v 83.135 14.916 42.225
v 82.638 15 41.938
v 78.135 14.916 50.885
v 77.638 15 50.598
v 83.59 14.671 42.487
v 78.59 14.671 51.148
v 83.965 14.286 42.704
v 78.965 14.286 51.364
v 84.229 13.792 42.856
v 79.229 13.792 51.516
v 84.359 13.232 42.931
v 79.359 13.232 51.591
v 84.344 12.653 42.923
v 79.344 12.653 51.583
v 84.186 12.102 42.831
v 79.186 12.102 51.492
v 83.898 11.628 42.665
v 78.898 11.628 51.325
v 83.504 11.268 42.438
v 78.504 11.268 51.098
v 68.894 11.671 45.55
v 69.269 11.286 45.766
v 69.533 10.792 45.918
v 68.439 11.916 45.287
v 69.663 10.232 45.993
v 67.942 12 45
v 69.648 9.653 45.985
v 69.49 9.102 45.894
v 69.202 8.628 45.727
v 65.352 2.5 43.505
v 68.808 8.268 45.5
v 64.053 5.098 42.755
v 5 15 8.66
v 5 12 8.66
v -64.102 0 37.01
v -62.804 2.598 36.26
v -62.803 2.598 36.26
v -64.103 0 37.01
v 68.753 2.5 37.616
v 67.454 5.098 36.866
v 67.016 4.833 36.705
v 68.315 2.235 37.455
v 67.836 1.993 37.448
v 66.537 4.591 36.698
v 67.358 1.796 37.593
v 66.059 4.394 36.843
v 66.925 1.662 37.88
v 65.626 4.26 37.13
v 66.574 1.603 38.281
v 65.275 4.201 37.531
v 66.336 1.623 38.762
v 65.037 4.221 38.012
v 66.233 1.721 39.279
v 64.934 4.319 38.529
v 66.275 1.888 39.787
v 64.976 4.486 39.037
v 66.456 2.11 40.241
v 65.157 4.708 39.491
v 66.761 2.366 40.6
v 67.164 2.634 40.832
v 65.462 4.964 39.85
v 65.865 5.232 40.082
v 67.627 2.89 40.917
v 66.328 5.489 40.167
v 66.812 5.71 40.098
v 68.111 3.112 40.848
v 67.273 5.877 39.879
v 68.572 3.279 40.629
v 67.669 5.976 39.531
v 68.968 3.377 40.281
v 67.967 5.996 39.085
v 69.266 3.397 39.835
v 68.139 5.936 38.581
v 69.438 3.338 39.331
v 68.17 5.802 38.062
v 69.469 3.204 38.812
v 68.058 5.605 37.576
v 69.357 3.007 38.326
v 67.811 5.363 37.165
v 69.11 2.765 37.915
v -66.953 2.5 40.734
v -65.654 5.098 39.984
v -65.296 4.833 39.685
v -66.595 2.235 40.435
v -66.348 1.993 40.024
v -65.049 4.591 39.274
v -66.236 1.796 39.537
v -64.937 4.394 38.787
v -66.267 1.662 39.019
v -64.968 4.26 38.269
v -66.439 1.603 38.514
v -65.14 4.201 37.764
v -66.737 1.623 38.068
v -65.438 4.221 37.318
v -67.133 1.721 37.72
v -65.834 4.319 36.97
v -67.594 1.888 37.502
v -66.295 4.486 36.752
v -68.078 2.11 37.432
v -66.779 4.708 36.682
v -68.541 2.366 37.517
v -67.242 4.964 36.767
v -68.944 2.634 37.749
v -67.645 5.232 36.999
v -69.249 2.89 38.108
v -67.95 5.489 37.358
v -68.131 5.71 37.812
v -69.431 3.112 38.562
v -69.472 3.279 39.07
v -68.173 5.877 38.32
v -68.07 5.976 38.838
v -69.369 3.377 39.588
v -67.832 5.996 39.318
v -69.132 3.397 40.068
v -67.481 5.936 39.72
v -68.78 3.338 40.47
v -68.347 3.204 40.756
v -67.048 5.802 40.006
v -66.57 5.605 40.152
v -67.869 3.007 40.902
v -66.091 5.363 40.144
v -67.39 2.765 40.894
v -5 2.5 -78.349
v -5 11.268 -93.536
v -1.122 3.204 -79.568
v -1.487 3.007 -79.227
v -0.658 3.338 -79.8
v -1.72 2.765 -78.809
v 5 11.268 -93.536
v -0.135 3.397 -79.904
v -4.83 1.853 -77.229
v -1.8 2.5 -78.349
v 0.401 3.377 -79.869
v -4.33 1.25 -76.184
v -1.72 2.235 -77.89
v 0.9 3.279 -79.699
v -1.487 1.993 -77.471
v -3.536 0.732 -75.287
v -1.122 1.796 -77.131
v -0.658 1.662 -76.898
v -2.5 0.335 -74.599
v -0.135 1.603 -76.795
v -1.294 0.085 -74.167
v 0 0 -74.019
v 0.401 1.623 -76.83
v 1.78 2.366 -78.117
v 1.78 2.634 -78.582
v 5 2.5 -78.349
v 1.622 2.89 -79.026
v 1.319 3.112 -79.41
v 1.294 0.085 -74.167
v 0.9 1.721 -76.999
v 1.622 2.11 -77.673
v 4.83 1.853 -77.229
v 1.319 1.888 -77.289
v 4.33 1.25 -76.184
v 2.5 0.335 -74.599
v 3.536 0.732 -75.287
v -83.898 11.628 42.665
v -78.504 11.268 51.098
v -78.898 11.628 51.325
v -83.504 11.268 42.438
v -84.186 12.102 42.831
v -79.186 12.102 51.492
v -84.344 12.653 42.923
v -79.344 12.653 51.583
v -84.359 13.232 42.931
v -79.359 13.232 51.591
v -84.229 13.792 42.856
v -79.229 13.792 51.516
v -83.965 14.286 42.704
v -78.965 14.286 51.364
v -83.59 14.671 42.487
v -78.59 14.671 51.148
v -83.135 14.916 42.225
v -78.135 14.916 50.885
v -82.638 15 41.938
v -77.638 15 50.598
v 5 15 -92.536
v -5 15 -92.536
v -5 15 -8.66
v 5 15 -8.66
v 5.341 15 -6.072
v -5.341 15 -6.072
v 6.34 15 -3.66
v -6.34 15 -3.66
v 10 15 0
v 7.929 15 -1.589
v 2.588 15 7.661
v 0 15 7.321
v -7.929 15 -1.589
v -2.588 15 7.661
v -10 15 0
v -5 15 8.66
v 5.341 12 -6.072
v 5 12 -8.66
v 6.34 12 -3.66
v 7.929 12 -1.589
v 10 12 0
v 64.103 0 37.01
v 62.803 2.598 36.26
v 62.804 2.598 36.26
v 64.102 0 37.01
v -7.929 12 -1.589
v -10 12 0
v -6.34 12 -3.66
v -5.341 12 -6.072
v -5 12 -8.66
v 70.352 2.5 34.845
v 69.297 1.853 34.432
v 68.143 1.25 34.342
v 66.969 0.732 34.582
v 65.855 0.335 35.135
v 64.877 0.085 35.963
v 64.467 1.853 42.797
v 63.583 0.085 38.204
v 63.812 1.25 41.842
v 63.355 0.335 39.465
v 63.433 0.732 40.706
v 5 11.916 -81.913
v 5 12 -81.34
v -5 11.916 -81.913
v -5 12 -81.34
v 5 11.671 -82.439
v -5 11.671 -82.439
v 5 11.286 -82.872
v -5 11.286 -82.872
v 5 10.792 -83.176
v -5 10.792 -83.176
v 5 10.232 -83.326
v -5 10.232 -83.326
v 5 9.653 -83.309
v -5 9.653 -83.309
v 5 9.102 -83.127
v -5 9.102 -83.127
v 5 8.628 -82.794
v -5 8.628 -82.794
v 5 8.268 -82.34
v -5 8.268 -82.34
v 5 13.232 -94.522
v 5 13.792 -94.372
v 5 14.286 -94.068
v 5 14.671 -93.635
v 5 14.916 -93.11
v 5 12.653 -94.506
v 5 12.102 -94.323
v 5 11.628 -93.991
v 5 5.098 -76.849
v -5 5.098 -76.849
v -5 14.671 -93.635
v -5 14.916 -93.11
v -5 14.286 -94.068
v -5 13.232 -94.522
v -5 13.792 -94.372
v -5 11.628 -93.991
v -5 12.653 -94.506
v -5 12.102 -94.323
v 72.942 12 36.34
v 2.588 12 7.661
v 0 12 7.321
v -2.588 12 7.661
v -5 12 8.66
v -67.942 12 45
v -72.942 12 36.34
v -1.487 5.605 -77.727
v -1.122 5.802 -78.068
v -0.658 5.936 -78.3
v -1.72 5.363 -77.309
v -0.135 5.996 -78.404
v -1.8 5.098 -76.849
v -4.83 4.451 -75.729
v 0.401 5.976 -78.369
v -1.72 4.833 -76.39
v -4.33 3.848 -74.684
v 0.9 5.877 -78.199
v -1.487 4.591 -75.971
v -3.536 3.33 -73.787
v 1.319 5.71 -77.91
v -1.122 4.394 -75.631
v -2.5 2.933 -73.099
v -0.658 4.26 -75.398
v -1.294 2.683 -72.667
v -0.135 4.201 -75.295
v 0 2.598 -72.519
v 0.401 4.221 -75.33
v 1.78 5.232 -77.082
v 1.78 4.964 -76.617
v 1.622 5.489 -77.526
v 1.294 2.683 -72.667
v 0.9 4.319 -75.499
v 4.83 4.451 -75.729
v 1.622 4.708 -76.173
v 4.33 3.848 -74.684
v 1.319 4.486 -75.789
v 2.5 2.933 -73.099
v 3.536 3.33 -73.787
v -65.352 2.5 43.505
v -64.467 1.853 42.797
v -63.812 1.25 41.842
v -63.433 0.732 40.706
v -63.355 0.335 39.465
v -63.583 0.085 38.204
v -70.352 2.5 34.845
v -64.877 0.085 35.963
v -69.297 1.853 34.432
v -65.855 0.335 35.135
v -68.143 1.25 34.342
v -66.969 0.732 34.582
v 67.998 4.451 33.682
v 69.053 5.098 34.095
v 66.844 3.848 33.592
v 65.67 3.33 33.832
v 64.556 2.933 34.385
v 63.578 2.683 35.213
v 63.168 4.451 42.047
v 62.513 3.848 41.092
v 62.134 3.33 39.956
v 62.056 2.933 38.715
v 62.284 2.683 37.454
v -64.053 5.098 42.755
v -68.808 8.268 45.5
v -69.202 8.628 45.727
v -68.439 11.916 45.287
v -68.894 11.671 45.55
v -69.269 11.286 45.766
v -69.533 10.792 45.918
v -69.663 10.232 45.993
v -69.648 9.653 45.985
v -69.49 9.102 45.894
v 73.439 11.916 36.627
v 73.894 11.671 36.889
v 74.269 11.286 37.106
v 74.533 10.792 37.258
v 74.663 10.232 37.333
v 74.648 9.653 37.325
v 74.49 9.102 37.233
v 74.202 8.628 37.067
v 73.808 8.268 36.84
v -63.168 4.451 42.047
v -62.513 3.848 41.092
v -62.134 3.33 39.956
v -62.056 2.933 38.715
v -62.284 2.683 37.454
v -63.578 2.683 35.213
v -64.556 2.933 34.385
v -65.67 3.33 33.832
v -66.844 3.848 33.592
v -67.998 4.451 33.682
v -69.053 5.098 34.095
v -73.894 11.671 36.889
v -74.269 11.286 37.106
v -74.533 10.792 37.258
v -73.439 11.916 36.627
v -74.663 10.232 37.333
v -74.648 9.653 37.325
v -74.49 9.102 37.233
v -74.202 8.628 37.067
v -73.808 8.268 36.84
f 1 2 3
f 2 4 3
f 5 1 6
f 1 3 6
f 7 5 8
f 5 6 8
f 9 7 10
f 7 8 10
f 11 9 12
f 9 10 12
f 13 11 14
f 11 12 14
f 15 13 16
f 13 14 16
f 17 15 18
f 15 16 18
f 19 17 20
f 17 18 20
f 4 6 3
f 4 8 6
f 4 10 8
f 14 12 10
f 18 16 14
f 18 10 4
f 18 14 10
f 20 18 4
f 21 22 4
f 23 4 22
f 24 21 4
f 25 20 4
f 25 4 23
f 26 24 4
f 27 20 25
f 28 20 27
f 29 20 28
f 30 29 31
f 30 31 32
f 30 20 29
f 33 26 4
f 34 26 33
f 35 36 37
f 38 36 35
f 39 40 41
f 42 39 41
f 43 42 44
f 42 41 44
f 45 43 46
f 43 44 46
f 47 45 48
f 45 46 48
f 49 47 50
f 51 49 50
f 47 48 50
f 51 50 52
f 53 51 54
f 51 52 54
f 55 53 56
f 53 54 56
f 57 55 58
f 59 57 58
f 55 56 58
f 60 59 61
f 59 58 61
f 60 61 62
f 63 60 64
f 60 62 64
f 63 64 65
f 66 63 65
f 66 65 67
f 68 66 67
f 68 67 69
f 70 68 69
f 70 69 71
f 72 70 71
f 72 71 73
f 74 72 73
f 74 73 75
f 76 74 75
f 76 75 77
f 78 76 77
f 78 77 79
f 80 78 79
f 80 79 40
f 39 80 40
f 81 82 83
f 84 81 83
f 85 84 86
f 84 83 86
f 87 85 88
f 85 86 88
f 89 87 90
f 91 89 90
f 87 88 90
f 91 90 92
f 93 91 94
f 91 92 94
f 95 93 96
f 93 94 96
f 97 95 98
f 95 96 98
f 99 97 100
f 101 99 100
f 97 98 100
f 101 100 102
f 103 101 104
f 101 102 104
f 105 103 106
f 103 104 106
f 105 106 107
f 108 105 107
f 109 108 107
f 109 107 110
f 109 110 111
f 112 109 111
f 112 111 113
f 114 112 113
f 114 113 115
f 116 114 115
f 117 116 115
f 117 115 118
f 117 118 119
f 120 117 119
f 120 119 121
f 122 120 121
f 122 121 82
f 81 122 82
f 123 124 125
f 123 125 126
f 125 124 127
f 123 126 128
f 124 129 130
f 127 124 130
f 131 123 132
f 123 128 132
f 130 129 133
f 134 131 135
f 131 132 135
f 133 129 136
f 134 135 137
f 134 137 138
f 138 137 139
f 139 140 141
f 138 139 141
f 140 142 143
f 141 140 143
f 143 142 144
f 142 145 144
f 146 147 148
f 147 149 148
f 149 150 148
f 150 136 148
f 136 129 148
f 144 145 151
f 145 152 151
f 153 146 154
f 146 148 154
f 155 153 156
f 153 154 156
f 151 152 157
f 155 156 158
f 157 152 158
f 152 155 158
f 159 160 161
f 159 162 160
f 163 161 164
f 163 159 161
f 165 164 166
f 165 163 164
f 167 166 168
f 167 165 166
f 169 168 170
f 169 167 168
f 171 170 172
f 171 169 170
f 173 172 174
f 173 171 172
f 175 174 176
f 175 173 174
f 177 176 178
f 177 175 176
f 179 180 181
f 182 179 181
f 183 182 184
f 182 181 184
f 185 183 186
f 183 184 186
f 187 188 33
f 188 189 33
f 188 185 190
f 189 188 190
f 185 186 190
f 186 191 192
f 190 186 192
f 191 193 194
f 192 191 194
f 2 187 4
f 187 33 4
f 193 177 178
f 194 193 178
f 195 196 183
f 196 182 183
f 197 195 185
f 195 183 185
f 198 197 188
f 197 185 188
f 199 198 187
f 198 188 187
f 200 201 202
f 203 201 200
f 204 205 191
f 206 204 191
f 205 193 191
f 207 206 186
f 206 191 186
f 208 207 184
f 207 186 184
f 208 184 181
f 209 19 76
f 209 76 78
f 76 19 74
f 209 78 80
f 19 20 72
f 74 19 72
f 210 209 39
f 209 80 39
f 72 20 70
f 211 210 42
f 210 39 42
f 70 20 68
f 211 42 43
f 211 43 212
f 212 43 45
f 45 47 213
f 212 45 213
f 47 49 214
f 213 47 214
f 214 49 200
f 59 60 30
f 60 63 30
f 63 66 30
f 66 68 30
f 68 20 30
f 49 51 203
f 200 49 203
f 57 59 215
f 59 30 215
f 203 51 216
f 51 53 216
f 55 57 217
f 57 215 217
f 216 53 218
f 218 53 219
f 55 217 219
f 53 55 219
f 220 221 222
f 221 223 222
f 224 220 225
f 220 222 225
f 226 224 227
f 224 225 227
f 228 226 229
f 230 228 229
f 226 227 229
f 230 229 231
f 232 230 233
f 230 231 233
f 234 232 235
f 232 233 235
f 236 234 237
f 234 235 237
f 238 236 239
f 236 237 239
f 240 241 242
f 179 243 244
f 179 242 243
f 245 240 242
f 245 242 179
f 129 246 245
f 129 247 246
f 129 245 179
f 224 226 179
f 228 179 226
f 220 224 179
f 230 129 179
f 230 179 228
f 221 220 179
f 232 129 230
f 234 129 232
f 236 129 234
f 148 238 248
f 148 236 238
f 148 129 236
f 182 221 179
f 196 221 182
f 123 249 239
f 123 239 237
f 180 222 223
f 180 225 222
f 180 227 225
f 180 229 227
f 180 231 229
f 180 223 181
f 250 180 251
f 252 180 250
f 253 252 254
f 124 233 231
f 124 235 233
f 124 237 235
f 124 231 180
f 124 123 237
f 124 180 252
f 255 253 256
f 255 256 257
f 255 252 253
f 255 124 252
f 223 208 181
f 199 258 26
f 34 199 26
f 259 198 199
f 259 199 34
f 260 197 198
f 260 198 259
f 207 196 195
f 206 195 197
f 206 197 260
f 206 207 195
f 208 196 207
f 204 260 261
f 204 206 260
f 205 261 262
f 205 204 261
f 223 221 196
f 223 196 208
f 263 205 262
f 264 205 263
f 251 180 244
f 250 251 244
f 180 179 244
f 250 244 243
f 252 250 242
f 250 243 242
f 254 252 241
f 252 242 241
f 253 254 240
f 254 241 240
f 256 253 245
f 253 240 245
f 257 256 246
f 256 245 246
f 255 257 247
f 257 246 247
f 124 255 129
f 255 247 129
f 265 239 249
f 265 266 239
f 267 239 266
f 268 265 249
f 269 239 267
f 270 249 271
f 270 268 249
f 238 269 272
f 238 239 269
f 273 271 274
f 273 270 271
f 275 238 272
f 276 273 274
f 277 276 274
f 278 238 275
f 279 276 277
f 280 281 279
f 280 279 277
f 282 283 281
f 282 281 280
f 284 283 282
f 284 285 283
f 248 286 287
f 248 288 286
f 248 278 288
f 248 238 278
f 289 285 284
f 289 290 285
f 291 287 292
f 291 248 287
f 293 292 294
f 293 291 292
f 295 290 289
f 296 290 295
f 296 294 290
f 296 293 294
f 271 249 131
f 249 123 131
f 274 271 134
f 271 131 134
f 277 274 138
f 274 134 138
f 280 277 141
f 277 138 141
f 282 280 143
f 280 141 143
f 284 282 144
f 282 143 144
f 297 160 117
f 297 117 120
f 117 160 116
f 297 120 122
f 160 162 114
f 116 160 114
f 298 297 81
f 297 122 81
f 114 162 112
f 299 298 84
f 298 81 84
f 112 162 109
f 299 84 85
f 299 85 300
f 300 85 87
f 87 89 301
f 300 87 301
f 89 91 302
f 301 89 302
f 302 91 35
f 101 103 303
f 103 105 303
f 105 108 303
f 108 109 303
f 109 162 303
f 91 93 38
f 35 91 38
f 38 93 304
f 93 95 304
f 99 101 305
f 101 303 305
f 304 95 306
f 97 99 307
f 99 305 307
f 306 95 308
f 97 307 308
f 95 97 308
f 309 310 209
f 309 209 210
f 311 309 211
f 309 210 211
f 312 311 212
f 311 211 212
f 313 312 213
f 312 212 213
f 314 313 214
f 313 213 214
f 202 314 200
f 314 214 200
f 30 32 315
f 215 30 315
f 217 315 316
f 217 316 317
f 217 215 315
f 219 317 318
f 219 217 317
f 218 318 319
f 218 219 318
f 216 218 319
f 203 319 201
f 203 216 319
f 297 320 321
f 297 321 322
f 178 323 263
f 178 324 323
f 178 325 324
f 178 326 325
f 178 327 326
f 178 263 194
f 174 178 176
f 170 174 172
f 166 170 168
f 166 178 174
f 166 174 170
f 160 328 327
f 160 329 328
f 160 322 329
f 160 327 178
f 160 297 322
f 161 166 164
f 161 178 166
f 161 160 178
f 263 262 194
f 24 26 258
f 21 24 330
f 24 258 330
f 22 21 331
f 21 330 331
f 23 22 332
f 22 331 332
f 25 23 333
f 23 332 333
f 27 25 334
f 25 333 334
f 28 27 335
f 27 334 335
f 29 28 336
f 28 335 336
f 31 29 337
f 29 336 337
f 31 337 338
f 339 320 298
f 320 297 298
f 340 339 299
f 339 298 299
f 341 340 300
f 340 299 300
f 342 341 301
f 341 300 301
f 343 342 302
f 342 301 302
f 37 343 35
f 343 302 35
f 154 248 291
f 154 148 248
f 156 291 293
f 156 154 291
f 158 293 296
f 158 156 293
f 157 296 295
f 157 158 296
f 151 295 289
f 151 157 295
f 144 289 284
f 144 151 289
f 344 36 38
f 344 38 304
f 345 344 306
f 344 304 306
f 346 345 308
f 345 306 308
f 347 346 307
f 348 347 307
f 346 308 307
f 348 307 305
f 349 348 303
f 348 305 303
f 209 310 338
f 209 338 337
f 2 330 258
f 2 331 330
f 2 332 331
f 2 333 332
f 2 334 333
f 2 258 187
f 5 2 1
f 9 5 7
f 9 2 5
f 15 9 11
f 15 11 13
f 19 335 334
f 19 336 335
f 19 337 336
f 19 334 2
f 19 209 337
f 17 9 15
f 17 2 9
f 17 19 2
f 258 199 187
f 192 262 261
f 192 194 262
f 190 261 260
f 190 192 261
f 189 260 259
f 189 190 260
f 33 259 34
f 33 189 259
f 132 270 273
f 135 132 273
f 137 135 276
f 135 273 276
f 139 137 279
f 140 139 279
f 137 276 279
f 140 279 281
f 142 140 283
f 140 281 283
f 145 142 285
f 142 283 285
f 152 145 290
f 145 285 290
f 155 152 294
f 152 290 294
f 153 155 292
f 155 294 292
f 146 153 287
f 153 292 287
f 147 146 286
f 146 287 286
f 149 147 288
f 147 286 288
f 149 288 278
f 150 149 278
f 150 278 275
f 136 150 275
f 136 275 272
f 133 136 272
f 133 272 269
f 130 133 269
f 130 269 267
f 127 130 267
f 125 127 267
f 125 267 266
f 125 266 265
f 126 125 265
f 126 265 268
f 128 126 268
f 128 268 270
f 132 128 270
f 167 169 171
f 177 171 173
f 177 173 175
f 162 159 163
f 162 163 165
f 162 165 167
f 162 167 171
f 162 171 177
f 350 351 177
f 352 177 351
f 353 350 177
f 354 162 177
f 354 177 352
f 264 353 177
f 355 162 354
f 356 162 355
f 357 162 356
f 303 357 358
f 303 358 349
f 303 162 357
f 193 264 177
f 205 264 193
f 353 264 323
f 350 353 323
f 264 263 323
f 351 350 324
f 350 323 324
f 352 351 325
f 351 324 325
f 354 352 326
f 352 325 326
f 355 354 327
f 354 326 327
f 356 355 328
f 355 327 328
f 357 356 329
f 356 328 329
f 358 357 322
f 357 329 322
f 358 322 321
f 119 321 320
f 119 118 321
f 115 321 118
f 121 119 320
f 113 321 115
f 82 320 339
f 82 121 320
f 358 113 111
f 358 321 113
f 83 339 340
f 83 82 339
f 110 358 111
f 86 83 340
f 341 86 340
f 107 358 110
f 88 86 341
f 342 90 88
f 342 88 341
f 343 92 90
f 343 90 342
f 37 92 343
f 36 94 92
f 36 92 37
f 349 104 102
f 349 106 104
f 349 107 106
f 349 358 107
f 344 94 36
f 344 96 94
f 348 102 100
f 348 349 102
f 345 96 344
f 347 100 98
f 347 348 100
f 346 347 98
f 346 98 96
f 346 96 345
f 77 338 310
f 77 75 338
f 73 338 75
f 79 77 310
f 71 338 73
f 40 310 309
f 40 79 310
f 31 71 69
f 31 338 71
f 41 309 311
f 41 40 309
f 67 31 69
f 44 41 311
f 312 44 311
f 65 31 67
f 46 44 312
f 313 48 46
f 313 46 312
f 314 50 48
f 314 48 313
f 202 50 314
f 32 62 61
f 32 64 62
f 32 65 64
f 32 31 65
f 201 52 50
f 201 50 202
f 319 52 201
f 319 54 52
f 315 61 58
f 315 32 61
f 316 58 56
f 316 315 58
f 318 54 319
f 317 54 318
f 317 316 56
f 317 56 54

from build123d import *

# Parameters (mm, degrees)
BOSS_EXTRUDE1_DEPTH      = 15
CUT_EXTRUDE1_REACH       = 103.612
M3_CLEARANCE_HOLE1_D     = 3.6
M3_CLEARANCE_HOLE1_DEPTH = 3
CUT_EXTRUDE2_REACH       = 103.612
CIRPATTERN1_COUNT        = 3
FILLET1_R                = 2
FILLET2_R                = 10
FILLET3_R                = 5


with BuildPart() as part:
    # Sketch2 → Boss-Extrude1 (new body)
    with BuildSketch(Plane(origin=(0, 0, 0), x_dir=(1, 0, 0), z_dir=(0, 1, 0))):
        Polygon((0, 0), (-5, 2.886751346), (-5, 100), (5, 100), (5, 2.886751346), align=None)
    boss_extrude1 = extrude(amount=BOSS_EXTRUDE1_DEPTH)

    # Sketch3 → Cut-Extrude1 (cut, up to next)
    with BuildSketch(Plane(origin=(5, 0, 0), x_dir=(0, 0, -1), z_dir=(1, 0, 0)), mode=Mode.PRIVATE) as cut_extrude1_sk1:
        Polygon((0, 12), (88.803847577, 12), (68.019237886, 0), (0, 0), align=None)
    cut_extrude1_tool1 = extrude(cut_extrude1_sk1.sketch, amount=-CUT_EXTRUDE1_REACH, mode=Mode.PRIVATE) & part.part
    # Sketch3 → Cut-Extrude1 (cut, up to next)
    with BuildSketch(Plane(origin=(5, 0, 0), x_dir=(0, 0, -1), z_dir=(1, 0, 0)), mode=Mode.PRIVATE) as cut_extrude1_sk2:
        Polygon((100, 15), (74.019237886, 0), (100, 0), align=None)
    cut_extrude1_tool2 = extrude(cut_extrude1_sk2.sketch, amount=-CUT_EXTRUDE1_REACH, mode=Mode.PRIVATE) & part.part
    cut_extrude1_1 = cut_extrude1_tool1.solids().sort_by_distance((5, 6.265071, -39.435329))[0]
    add(cut_extrude1_1, mode=Mode.SUBTRACT)
    cut_extrude1_2 = cut_extrude1_tool2.solids().sort_by_distance((5, 5, -91.339746))[0]
    add(cut_extrude1_2, mode=Mode.SUBTRACT)
    cut_extrude1 = cut_extrude1_1 + cut_extrude1_2  # Cut-Extrude1 as one shape, for the pattern or mirror that repeats it

    # M3 Clearance Hole1
    with Locations(Plane(origin=(0, -32.051270189, -18.504809472), x_dir=(1, 0, 0), z_dir=(0, -0.8660254037844417, -0.49999999999999484))):
        with Locations((0, -69.102540378)):
            m3_clearance_hole1 = Hole(M3_CLEARANCE_HOLE1_D / 2, depth=M3_CLEARANCE_HOLE1_DEPTH)

    # Sketch6 → Cut-Extrude2 (cut, up to next)
    with BuildSketch(Plane(origin=(5, 0, 0), x_dir=(0, 0, -1), z_dir=(1, 0, 0)), mode=Mode.PRIVATE) as cut_extrude2_sk1:
        Polygon((74.019237886, 0), (68.019237886, 0), (72.519237886, 2.598076211), align=None)
    cut_extrude2_tool1 = extrude(cut_extrude2_sk1.sketch, amount=-CUT_EXTRUDE2_REACH, mode=Mode.PRIVATE) & part.part
    cut_extrude2 = cut_extrude2_tool1.solids().sort_by_distance((5, 0.866025, -71.519238))[0]
    add(cut_extrude2, mode=Mode.SUBTRACT)

    # CirPattern1: Boss-Extrude1, Cut-Extrude1, M3 Clearance Hole1, Cut-Extrude2 ×3 about axis
    cirpattern1_axis = Axis((0, 0, 0), (0, 1, 0))
    add([boss_extrude1.rotate(cirpattern1_axis, i * 360 / CIRPATTERN1_COUNT) for i in range(1, CIRPATTERN1_COUNT)])
    add([cut_extrude1.rotate(cirpattern1_axis, i * 360 / CIRPATTERN1_COUNT) for i in range(1, CIRPATTERN1_COUNT)], mode=Mode.SUBTRACT)
    add([m3_clearance_hole1.rotate(cirpattern1_axis, i * 360 / CIRPATTERN1_COUNT) for i in range(1, CIRPATTERN1_COUNT)], mode=Mode.SUBTRACT)
    add([cut_extrude2.rotate(cirpattern1_axis, i * 360 / CIRPATTERN1_COUNT) for i in range(1, CIRPATTERN1_COUNT)], mode=Mode.SUBTRACT)

    # Fillet1
    fillet1_edges = [part.edges().sort_by_distance(p)[0] for p in [
        (76.906387956, 12, 44.401923789),
        (-76.906387956, 12, 44.401923789),
        (0, 15, -100),
        (0, 12, -88.803847577),
        (-86.602540378, 15, 50),
        (86.602540378, 15, 50),
    ]]
    fillet(fillet1_edges, radius=FILLET1_R)

    # Fillet2
    fillet2_edges = [part.edges().sort_by_distance(p)[0] for p in [
        (0, 13.5, 5.773502692),
        (-5, 13.5, -2.886751346),
        (5, 13.5, -2.886751346),
    ]]
    fillet(fillet2_edges, radius=FILLET2_R)

    # Fillet3
    fillet3_edges = [part.edges().sort_by_distance(p)[0] for p in [
        (65.953021326, 1.299038106, 32.304491924),
        (60.953021326, 1.299038106, 40.964745962),
        (-60.953021326, 1.299038106, 40.964745962),
        (-65.953021326, 1.299038106, 32.304491924),
        (-5, 1.299038106, -73.269237886),
        (5, 1.299038106, -73.269237886),
    ]]
    fillet(fillet3_edges, radius=FILLET3_R - 0.0001)  # a hair under: the kernel refuses the full size


solid = part.part
